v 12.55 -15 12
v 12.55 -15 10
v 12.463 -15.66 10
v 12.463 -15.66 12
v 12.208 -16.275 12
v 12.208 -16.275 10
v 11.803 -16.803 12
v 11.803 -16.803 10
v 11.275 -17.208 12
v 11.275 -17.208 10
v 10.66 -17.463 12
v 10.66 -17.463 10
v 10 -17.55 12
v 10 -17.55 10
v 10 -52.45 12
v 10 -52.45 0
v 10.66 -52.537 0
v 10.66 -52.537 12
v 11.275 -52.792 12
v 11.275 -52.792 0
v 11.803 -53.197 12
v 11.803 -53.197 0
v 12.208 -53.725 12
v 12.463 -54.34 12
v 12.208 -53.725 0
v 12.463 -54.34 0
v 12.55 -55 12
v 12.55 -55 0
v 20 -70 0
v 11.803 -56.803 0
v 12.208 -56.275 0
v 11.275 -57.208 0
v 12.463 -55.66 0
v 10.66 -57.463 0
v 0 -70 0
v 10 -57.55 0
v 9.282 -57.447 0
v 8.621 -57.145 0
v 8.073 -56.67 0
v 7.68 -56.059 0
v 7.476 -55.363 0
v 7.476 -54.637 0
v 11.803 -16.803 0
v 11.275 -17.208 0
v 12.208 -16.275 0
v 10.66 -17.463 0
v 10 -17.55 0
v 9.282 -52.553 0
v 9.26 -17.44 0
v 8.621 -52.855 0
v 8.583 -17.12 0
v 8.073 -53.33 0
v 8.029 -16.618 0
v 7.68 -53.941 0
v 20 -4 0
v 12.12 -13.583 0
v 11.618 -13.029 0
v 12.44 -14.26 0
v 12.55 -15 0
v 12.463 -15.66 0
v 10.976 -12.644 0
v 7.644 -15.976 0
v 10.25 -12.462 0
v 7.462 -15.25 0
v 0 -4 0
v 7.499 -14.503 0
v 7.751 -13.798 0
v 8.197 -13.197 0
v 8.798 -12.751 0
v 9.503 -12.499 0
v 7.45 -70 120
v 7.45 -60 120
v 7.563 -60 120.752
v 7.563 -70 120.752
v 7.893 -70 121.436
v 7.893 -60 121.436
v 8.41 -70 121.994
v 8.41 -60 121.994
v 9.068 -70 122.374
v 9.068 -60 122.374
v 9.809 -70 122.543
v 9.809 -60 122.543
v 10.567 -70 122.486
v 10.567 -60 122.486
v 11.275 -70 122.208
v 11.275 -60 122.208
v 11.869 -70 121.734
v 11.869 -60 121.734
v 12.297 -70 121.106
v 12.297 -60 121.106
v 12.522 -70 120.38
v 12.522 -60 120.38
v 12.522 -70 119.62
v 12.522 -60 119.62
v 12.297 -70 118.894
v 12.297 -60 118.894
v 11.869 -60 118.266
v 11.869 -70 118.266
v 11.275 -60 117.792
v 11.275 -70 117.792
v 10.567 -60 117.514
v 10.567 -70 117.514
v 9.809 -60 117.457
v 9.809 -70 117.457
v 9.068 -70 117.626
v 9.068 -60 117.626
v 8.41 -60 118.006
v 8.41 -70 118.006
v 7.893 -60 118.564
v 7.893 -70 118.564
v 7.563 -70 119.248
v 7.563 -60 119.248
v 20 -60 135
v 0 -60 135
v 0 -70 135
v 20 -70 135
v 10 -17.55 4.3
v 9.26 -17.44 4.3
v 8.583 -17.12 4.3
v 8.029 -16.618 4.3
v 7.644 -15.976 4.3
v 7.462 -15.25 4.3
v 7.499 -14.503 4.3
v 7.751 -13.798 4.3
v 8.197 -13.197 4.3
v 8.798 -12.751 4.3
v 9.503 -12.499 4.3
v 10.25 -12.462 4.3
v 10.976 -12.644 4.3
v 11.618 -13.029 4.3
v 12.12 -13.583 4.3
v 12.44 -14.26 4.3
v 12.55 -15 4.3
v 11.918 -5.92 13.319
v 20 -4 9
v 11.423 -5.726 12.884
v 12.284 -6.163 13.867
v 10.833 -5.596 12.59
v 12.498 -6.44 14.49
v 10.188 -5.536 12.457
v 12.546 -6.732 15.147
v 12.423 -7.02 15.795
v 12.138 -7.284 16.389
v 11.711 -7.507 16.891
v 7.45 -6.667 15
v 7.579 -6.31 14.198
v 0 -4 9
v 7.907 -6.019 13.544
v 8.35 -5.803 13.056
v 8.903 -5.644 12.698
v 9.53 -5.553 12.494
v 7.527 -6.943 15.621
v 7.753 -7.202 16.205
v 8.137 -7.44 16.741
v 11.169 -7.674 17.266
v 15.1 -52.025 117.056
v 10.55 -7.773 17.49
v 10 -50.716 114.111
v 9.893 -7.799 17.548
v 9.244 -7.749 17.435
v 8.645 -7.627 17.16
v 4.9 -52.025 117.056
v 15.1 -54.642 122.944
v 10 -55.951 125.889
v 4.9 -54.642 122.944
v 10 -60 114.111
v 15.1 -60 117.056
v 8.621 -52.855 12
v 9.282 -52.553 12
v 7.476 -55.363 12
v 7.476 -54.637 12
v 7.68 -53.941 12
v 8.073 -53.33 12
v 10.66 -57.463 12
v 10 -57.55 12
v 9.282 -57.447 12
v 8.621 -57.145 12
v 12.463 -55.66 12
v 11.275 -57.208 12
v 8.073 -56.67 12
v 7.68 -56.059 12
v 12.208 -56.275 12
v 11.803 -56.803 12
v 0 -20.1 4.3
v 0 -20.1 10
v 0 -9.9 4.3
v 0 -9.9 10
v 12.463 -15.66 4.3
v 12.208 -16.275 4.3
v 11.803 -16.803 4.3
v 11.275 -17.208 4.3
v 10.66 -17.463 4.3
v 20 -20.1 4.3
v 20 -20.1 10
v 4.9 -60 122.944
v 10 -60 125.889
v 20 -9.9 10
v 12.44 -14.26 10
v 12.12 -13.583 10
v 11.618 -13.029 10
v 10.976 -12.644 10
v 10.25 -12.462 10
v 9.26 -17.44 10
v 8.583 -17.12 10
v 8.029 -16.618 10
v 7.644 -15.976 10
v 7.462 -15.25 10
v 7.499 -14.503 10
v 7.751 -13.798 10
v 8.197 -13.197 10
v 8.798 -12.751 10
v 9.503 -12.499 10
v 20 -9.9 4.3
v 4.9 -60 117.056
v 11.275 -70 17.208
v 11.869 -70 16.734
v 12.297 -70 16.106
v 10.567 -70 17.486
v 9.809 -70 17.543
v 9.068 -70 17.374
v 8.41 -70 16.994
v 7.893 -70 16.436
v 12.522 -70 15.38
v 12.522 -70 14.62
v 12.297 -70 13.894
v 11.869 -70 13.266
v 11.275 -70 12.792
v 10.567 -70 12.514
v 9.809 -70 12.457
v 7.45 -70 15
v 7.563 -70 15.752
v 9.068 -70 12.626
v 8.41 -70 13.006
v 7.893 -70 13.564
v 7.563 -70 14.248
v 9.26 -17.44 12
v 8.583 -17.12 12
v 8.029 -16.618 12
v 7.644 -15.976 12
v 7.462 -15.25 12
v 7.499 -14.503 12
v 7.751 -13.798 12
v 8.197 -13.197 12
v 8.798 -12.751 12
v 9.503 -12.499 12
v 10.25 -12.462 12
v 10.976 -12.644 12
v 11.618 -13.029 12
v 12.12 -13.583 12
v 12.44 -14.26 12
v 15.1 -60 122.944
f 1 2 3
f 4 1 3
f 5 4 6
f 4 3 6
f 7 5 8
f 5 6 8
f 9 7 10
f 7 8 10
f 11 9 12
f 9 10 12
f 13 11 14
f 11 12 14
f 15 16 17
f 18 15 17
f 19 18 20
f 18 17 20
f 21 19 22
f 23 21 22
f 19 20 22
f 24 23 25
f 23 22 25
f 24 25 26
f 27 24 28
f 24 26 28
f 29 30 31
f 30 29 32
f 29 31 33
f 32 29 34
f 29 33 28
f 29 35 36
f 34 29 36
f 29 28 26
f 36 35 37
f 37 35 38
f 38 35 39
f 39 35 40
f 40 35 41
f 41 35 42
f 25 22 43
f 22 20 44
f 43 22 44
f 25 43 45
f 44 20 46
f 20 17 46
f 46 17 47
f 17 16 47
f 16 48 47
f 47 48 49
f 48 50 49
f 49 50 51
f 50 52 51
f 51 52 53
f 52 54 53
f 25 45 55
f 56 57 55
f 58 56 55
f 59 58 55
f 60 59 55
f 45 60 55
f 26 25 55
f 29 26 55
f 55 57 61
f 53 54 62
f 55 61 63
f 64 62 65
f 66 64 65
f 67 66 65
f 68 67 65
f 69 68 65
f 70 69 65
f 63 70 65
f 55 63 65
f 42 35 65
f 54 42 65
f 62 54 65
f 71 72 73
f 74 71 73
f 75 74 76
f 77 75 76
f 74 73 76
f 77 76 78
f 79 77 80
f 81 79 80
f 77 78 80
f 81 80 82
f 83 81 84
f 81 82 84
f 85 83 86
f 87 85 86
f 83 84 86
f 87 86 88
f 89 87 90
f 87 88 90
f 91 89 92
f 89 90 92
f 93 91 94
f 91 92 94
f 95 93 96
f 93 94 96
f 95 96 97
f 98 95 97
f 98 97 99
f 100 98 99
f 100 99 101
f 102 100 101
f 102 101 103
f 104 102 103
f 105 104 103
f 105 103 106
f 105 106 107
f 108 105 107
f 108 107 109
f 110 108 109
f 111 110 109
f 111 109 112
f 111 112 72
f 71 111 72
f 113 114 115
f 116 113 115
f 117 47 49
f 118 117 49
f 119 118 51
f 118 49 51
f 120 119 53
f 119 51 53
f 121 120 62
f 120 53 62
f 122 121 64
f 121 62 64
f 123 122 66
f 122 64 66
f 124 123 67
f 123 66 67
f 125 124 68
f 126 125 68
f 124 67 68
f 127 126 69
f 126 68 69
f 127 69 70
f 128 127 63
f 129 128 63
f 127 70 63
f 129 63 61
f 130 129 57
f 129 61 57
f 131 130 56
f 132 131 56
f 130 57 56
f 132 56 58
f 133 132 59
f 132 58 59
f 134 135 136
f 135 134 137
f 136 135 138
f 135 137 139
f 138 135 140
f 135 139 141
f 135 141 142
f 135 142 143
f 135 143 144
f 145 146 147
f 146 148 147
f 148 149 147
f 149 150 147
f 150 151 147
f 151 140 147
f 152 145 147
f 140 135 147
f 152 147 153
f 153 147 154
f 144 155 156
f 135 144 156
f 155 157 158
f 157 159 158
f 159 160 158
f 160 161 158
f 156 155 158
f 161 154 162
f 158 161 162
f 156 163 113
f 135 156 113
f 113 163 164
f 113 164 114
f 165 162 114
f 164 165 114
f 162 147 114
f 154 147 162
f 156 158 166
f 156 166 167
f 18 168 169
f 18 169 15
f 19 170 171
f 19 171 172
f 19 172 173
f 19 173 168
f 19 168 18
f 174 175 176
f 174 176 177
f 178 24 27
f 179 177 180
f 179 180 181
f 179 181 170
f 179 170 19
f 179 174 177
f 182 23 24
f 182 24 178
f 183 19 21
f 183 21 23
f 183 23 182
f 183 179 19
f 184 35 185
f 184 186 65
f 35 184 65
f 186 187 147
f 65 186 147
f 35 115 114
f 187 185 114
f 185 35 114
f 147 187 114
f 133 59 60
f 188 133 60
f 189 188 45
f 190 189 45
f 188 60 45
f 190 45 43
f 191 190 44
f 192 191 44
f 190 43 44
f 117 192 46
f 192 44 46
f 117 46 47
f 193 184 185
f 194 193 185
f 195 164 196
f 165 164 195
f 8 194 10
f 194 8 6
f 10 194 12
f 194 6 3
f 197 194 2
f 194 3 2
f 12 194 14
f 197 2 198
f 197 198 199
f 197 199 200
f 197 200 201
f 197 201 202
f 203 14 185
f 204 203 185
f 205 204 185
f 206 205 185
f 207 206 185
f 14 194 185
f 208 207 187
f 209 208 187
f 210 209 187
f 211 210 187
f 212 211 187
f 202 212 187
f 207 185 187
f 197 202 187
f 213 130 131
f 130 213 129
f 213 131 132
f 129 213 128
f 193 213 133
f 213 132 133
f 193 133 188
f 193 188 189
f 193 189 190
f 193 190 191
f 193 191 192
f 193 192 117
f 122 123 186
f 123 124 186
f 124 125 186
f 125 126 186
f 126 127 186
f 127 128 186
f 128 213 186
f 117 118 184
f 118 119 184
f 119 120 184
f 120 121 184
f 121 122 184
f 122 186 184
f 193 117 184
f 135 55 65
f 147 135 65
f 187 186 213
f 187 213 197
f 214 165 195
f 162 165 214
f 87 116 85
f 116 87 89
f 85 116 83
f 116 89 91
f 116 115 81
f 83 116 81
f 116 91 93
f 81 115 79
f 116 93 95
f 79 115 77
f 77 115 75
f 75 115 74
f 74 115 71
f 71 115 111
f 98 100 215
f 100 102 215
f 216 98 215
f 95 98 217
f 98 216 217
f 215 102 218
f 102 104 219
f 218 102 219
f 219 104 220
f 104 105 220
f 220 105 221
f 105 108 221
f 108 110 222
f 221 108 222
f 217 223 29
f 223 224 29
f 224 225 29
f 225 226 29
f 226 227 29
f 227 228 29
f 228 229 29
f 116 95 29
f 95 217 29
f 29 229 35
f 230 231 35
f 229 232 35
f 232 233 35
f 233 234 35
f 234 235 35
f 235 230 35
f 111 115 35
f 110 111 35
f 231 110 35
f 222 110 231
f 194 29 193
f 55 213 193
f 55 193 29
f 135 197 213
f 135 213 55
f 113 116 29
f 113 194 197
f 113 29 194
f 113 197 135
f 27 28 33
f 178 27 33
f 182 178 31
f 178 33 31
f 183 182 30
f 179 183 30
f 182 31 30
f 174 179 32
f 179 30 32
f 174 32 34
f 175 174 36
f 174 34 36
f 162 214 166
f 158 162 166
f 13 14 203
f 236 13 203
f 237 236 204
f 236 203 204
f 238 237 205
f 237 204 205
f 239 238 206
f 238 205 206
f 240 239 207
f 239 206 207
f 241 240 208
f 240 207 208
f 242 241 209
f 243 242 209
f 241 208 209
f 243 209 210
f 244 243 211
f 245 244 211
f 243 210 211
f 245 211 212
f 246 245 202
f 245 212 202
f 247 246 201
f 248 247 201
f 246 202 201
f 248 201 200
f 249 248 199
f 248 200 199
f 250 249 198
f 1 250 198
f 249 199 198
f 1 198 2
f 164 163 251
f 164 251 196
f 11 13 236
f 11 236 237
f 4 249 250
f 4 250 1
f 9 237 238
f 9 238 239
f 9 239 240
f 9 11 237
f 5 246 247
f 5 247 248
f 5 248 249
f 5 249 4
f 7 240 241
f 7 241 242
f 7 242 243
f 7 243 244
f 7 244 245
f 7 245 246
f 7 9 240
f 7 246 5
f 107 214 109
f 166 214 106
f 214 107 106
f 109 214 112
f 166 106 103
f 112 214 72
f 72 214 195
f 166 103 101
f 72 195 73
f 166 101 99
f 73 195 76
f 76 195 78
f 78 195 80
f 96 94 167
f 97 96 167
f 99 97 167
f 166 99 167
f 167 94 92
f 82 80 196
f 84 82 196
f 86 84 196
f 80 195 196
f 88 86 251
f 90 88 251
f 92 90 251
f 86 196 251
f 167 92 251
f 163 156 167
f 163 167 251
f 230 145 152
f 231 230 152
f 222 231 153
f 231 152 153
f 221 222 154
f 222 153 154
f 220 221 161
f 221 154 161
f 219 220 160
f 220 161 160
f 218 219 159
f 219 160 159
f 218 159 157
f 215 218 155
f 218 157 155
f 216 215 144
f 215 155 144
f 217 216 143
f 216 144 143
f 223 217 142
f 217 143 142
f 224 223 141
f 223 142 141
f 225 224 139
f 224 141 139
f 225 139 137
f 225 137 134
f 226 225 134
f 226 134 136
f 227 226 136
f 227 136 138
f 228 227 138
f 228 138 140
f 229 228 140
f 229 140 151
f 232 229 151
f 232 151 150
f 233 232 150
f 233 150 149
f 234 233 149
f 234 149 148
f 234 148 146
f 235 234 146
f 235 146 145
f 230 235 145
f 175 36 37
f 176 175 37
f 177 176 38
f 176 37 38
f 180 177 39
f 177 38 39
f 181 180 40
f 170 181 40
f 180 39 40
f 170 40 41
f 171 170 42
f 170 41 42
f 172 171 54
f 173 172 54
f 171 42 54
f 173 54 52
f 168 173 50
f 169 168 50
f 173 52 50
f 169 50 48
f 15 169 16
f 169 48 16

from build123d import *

# Parameters (mm, degrees)
F1_DEPTH  = 20
F3_D      = 5.1
F5_DEPTH  = 12
F6_DEPTH  = 25
F7_DEPTH  = 15
F8_D      = 5.1
F9_W      = 5.1
F9_H      = 5.7
F10_DEPTH = 25
F4_W      = 10
F4_H      = 4
F11_DEPTH = 25


# Not quite as in the source:
# - a feature names something its author has since deleted; it is built from what else it names


with BuildPart() as f1:
    # F0 (on Right) → F1 (new body)
    with BuildSketch(Plane.YZ):
        Polygon((-70, 0), (0, 0), (-60, 135), (-70, 135), align=None)
    extrude(amount=F1_DEPTH)

    # F3 (through all)
    with Locations(Plane.XZ.offset(70)):
        with Locations((10, 15), (10, 120)):
            Hole(F3_D / 2)

    # F4 (on face) → F5 (cut)
    with BuildSketch(Plane(origin=(0, 0, 0), x_dir=(1, 0, 0), z_dir=(0, 0, -1))):
        with BuildLine():
            ThreePointArc((12.55, 55), (11.803122292, 56.803122292), (10, 57.55))
            Line((10, 57.55), (10, 55))
            Line((10, 55), (10, 52.45))
            ThreePointArc((10, 52.45), (11.803122292, 53.196877708), (12.55, 55))
        make_face()
        with BuildLine():
            ThreePointArc((12.55, 15), (11.803122292, 16.803122292), (10, 17.55))
            ThreePointArc((10, 17.55), (8.196877708, 13.196877708), (12.55, 15))
        make_face()
        with BuildLine():
            Line((10, 55), (10, 57.55))
            ThreePointArc((10, 57.55), (7.45, 55), (10, 52.45))
            Line((10, 52.45), (10, 55))
        make_face()
    extrude(amount=-F5_DEPTH, mode=Mode.SUBTRACT)

    # F2 (on face) → F6 (join)
    with BuildSketch(Plane.XZ.offset(70)):
        Polygon((15.1, 122.9444863729), (10, 125.8889727457), (4.9, 122.9444863729), (4.9, 117.0555136271), (10, 114.1110272543), (15.1, 117.0555136271), align=None)
    extrude(amount=-F6_DEPTH)

    # F7 (cut): a face of the model
    f7_faces = [f1.faces().sort_by_distance(p)[0] for p in [
        (10, -45, 120),
    ]]
    extrude(f7_faces, amount=-F7_DEPTH, mode=Mode.SUBTRACT)

    # F8 (through all)
    with Locations(Plane.XZ.offset(70)):
        with Locations((10, 120)):
            Hole(F8_D / 2)

    # F9 (on face) → F10 (cut)
    with BuildSketch(Plane(origin=(0, 0, 0), x_dir=(0, -1, 0), z_dir=(-1, 0, 0))):
        with Locations((12.45, 7.15)):
            Rectangle(F9_W, F9_H)
        with Locations((17.55, 7.15)):
            Rectangle(F9_W, F9_H)
    extrude(amount=-F10_DEPTH, mode=Mode.SUBTRACT)

    # F4 (on face) → F11 (cut)
    with BuildSketch(Plane(origin=(0, 0, 0), x_dir=(1, 0, 0), z_dir=(0, 0, -1))):
        with Locations((15, 2)):
            Rectangle(F4_W, F4_H)
        with Locations((5, 2)):
            Rectangle(F4_W, F4_H)
    extrude(amount=-F11_DEPTH, mode=Mode.SUBTRACT)


solid = f1.part
